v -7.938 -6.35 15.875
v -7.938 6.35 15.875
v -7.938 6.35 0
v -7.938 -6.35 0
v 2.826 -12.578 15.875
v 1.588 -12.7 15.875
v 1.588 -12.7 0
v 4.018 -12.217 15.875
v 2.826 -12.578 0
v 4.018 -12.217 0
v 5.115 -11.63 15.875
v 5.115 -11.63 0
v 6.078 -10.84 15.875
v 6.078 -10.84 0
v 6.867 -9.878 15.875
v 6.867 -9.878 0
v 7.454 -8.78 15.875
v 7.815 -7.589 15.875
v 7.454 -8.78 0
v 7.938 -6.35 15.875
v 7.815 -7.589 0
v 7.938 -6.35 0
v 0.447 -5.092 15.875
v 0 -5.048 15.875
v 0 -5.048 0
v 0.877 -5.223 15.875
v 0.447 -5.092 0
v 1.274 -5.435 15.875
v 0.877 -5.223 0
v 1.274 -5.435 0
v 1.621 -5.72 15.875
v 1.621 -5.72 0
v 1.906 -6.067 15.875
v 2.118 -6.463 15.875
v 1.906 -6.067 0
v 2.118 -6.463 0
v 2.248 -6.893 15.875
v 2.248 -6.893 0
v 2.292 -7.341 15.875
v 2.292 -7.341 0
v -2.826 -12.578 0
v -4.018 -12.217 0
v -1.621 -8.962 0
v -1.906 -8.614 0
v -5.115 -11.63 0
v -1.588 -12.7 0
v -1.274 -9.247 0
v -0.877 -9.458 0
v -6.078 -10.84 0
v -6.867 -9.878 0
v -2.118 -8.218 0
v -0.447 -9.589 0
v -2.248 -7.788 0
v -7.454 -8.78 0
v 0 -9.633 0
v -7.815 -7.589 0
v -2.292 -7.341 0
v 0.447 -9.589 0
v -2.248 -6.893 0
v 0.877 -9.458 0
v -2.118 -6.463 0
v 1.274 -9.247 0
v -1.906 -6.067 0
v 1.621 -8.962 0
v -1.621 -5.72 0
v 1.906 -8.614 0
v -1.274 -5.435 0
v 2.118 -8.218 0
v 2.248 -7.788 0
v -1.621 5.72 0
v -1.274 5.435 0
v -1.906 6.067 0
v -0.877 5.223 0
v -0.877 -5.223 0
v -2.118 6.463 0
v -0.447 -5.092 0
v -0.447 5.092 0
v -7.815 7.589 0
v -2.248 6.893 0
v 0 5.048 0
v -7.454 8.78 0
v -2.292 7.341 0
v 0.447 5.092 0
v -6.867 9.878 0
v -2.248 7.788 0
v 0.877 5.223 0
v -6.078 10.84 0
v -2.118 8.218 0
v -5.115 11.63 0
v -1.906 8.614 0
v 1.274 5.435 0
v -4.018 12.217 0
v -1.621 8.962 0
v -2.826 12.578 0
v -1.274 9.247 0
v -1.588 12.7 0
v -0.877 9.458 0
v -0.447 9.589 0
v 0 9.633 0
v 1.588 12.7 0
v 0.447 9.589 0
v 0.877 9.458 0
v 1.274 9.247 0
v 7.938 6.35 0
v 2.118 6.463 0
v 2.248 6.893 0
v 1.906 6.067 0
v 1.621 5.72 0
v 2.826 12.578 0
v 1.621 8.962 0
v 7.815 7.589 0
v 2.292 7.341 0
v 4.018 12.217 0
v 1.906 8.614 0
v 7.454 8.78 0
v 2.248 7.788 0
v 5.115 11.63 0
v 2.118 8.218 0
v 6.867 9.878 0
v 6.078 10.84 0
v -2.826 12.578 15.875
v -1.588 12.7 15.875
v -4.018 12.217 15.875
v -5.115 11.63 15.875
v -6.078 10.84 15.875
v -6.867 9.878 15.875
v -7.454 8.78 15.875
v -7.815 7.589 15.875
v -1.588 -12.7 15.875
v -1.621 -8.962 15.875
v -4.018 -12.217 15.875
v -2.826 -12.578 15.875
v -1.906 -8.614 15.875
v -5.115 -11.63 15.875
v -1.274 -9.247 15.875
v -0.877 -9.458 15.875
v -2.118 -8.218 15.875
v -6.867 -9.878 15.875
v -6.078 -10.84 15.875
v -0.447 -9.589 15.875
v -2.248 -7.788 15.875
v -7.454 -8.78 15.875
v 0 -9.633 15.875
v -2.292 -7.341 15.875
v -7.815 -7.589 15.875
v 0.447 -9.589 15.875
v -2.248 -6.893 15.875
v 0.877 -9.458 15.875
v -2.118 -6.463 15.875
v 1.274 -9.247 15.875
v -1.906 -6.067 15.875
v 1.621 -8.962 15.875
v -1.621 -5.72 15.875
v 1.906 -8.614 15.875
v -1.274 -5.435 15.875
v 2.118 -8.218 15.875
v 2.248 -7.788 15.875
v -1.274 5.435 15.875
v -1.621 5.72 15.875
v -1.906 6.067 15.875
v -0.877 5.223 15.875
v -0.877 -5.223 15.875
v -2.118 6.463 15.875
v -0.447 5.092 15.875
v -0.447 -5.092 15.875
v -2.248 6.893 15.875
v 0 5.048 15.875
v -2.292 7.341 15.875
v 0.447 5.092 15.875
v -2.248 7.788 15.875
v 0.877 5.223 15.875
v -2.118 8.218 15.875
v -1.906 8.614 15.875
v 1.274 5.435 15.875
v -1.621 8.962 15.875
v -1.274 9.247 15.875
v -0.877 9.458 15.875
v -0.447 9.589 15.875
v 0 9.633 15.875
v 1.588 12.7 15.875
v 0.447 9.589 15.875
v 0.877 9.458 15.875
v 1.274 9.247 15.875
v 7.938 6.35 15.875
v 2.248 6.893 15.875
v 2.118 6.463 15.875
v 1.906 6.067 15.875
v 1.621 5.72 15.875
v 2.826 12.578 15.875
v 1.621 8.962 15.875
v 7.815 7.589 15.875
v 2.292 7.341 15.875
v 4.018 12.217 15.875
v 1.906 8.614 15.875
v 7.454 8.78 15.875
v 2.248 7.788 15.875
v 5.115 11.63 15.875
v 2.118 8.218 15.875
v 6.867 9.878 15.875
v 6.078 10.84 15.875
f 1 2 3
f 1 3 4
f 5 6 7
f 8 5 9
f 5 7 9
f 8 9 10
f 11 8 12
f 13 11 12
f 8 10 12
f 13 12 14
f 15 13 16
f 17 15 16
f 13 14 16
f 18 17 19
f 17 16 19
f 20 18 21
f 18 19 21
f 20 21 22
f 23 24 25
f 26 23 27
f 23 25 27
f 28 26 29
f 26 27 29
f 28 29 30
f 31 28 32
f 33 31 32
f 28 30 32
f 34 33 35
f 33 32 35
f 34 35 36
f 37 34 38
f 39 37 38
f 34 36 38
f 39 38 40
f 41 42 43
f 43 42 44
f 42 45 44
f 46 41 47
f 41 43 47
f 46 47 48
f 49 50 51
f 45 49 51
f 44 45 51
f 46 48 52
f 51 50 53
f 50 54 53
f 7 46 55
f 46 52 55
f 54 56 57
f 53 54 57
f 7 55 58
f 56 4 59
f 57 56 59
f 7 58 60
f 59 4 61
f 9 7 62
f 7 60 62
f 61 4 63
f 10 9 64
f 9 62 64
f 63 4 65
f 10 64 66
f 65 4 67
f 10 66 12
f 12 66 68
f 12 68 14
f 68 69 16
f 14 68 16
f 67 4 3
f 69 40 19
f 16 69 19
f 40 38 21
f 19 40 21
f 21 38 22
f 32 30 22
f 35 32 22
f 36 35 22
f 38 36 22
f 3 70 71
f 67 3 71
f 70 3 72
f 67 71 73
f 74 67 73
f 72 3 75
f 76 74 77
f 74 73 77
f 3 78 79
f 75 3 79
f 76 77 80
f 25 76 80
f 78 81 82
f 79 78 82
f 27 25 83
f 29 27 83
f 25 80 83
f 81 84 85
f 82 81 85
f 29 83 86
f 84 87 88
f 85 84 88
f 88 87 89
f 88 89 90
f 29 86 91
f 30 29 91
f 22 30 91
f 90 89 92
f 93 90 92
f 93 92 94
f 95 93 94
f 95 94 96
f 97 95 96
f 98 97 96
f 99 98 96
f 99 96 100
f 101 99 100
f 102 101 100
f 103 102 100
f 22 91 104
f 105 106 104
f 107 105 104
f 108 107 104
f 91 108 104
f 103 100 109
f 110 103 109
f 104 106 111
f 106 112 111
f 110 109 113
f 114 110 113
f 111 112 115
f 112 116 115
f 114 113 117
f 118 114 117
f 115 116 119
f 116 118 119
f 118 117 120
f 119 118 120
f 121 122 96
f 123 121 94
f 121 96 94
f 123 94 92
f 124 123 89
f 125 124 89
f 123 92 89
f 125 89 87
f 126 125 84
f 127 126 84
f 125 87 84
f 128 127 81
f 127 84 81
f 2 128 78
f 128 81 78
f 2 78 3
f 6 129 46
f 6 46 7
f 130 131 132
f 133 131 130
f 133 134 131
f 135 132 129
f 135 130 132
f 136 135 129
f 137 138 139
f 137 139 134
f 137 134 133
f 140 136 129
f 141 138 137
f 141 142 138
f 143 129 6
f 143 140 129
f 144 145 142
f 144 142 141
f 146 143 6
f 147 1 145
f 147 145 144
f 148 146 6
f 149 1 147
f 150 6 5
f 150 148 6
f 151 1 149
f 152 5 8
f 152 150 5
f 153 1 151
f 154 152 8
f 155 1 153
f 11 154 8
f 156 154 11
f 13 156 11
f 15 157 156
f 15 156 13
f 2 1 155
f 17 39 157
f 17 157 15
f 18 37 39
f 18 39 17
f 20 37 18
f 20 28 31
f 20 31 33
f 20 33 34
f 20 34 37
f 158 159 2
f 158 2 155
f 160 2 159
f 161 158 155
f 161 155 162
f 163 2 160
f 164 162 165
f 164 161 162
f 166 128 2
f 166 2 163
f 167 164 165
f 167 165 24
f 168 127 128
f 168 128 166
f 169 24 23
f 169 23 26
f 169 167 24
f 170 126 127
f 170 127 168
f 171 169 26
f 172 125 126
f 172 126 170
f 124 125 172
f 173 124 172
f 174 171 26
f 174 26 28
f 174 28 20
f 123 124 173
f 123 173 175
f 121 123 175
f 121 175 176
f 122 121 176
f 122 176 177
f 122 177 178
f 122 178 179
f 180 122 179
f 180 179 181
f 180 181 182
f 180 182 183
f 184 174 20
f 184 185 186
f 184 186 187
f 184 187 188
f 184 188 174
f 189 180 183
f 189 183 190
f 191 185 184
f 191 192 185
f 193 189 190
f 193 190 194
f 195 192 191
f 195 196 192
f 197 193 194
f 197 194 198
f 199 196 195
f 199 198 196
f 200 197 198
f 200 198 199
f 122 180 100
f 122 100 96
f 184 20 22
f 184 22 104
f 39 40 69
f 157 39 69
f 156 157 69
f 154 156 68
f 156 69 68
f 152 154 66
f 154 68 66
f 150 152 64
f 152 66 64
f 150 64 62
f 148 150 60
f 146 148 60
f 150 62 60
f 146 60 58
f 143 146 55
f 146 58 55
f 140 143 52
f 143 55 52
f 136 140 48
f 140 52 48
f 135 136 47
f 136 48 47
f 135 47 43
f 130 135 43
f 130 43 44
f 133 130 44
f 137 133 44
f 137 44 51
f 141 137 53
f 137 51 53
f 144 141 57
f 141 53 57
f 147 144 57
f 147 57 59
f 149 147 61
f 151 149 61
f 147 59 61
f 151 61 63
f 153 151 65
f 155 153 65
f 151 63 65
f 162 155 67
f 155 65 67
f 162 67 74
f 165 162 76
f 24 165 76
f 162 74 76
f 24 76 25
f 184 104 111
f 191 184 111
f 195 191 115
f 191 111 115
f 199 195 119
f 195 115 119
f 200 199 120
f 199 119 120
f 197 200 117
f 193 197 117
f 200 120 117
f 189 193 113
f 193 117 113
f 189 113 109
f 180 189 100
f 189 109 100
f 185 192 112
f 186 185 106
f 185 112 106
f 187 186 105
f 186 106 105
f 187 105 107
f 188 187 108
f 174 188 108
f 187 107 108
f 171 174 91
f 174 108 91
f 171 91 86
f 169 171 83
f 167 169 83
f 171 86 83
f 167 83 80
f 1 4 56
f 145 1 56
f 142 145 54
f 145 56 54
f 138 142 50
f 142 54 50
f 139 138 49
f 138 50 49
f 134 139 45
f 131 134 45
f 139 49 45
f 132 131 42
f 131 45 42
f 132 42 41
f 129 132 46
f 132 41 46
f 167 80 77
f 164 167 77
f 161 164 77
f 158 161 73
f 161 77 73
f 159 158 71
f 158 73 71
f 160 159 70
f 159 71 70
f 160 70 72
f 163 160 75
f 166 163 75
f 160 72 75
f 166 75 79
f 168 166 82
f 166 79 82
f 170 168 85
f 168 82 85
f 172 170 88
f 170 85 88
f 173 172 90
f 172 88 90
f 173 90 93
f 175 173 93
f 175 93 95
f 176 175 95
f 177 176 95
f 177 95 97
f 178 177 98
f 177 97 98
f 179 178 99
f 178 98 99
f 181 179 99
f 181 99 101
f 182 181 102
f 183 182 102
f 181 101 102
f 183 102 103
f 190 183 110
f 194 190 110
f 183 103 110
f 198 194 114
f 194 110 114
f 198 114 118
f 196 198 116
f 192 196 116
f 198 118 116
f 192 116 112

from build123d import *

# Parameters (mm, degrees)
F1_DEPTH = 15.875


with BuildPart() as f1:
    # F0 (on Top) → F1 (new body)
    with BuildSketch(Plane.XY):
        with BuildLine():
            ThreePointArc((0, 5.04825), (1.620936, 5.719664), (2.29235, 7.3406))
            ThreePointArc((2.29235, 7.3406), (-1.620936, 8.961536), (0, 5.04825))
        make_face()
        with BuildLine():
            ThreePointArc((2.29235, -7.3406), (1.620936, -5.719664), (0, -5.04825))
            ThreePointArc((0, -5.04825), (-1.620936, -8.961536), (2.29235, -7.3406))
        make_face()
        with BuildLine():
            Line((1.5875, 12.7), (-1.5875, 12.7))
            ThreePointArc((-1.5875, 12.7), (-6.077628, 10.840128), (-7.9375, 6.35))
            Line((-7.9375, 6.35), (-7.9375, -6.35))
            ThreePointArc((-7.9375, -6.35), (-6.077628, -10.840128), (-1.5875, -12.7))
            Line((-1.5875, -12.7), (1.5875, -12.7))
            ThreePointArc((1.5875, -12.7), (6.077628, -10.840128), (7.9375, -6.35))
            Line((7.9375, -6.35), (7.9375, 6.35))
            ThreePointArc((7.9375, 6.35), (6.077628, 10.840128), (1.5875, 12.7))
        make_face()
        with BuildLine():
            ThreePointArc((2.29235, -7.3406), (-1.620936, -8.961536), (0, -5.04825))
            ThreePointArc((0, -5.04825), (1.620936, -5.719664), (2.29235, -7.3406))
        make_face(mode=Mode.SUBTRACT)
        with BuildLine():
            ThreePointArc((0, 5.04825), (-1.620936, 8.961536), (2.29235, 7.3406))
            ThreePointArc((2.29235, 7.3406), (1.620936, 5.719664), (0, 5.04825))
        make_face(mode=Mode.SUBTRACT)
    extrude(amount=F1_DEPTH)


solid = f1.part
